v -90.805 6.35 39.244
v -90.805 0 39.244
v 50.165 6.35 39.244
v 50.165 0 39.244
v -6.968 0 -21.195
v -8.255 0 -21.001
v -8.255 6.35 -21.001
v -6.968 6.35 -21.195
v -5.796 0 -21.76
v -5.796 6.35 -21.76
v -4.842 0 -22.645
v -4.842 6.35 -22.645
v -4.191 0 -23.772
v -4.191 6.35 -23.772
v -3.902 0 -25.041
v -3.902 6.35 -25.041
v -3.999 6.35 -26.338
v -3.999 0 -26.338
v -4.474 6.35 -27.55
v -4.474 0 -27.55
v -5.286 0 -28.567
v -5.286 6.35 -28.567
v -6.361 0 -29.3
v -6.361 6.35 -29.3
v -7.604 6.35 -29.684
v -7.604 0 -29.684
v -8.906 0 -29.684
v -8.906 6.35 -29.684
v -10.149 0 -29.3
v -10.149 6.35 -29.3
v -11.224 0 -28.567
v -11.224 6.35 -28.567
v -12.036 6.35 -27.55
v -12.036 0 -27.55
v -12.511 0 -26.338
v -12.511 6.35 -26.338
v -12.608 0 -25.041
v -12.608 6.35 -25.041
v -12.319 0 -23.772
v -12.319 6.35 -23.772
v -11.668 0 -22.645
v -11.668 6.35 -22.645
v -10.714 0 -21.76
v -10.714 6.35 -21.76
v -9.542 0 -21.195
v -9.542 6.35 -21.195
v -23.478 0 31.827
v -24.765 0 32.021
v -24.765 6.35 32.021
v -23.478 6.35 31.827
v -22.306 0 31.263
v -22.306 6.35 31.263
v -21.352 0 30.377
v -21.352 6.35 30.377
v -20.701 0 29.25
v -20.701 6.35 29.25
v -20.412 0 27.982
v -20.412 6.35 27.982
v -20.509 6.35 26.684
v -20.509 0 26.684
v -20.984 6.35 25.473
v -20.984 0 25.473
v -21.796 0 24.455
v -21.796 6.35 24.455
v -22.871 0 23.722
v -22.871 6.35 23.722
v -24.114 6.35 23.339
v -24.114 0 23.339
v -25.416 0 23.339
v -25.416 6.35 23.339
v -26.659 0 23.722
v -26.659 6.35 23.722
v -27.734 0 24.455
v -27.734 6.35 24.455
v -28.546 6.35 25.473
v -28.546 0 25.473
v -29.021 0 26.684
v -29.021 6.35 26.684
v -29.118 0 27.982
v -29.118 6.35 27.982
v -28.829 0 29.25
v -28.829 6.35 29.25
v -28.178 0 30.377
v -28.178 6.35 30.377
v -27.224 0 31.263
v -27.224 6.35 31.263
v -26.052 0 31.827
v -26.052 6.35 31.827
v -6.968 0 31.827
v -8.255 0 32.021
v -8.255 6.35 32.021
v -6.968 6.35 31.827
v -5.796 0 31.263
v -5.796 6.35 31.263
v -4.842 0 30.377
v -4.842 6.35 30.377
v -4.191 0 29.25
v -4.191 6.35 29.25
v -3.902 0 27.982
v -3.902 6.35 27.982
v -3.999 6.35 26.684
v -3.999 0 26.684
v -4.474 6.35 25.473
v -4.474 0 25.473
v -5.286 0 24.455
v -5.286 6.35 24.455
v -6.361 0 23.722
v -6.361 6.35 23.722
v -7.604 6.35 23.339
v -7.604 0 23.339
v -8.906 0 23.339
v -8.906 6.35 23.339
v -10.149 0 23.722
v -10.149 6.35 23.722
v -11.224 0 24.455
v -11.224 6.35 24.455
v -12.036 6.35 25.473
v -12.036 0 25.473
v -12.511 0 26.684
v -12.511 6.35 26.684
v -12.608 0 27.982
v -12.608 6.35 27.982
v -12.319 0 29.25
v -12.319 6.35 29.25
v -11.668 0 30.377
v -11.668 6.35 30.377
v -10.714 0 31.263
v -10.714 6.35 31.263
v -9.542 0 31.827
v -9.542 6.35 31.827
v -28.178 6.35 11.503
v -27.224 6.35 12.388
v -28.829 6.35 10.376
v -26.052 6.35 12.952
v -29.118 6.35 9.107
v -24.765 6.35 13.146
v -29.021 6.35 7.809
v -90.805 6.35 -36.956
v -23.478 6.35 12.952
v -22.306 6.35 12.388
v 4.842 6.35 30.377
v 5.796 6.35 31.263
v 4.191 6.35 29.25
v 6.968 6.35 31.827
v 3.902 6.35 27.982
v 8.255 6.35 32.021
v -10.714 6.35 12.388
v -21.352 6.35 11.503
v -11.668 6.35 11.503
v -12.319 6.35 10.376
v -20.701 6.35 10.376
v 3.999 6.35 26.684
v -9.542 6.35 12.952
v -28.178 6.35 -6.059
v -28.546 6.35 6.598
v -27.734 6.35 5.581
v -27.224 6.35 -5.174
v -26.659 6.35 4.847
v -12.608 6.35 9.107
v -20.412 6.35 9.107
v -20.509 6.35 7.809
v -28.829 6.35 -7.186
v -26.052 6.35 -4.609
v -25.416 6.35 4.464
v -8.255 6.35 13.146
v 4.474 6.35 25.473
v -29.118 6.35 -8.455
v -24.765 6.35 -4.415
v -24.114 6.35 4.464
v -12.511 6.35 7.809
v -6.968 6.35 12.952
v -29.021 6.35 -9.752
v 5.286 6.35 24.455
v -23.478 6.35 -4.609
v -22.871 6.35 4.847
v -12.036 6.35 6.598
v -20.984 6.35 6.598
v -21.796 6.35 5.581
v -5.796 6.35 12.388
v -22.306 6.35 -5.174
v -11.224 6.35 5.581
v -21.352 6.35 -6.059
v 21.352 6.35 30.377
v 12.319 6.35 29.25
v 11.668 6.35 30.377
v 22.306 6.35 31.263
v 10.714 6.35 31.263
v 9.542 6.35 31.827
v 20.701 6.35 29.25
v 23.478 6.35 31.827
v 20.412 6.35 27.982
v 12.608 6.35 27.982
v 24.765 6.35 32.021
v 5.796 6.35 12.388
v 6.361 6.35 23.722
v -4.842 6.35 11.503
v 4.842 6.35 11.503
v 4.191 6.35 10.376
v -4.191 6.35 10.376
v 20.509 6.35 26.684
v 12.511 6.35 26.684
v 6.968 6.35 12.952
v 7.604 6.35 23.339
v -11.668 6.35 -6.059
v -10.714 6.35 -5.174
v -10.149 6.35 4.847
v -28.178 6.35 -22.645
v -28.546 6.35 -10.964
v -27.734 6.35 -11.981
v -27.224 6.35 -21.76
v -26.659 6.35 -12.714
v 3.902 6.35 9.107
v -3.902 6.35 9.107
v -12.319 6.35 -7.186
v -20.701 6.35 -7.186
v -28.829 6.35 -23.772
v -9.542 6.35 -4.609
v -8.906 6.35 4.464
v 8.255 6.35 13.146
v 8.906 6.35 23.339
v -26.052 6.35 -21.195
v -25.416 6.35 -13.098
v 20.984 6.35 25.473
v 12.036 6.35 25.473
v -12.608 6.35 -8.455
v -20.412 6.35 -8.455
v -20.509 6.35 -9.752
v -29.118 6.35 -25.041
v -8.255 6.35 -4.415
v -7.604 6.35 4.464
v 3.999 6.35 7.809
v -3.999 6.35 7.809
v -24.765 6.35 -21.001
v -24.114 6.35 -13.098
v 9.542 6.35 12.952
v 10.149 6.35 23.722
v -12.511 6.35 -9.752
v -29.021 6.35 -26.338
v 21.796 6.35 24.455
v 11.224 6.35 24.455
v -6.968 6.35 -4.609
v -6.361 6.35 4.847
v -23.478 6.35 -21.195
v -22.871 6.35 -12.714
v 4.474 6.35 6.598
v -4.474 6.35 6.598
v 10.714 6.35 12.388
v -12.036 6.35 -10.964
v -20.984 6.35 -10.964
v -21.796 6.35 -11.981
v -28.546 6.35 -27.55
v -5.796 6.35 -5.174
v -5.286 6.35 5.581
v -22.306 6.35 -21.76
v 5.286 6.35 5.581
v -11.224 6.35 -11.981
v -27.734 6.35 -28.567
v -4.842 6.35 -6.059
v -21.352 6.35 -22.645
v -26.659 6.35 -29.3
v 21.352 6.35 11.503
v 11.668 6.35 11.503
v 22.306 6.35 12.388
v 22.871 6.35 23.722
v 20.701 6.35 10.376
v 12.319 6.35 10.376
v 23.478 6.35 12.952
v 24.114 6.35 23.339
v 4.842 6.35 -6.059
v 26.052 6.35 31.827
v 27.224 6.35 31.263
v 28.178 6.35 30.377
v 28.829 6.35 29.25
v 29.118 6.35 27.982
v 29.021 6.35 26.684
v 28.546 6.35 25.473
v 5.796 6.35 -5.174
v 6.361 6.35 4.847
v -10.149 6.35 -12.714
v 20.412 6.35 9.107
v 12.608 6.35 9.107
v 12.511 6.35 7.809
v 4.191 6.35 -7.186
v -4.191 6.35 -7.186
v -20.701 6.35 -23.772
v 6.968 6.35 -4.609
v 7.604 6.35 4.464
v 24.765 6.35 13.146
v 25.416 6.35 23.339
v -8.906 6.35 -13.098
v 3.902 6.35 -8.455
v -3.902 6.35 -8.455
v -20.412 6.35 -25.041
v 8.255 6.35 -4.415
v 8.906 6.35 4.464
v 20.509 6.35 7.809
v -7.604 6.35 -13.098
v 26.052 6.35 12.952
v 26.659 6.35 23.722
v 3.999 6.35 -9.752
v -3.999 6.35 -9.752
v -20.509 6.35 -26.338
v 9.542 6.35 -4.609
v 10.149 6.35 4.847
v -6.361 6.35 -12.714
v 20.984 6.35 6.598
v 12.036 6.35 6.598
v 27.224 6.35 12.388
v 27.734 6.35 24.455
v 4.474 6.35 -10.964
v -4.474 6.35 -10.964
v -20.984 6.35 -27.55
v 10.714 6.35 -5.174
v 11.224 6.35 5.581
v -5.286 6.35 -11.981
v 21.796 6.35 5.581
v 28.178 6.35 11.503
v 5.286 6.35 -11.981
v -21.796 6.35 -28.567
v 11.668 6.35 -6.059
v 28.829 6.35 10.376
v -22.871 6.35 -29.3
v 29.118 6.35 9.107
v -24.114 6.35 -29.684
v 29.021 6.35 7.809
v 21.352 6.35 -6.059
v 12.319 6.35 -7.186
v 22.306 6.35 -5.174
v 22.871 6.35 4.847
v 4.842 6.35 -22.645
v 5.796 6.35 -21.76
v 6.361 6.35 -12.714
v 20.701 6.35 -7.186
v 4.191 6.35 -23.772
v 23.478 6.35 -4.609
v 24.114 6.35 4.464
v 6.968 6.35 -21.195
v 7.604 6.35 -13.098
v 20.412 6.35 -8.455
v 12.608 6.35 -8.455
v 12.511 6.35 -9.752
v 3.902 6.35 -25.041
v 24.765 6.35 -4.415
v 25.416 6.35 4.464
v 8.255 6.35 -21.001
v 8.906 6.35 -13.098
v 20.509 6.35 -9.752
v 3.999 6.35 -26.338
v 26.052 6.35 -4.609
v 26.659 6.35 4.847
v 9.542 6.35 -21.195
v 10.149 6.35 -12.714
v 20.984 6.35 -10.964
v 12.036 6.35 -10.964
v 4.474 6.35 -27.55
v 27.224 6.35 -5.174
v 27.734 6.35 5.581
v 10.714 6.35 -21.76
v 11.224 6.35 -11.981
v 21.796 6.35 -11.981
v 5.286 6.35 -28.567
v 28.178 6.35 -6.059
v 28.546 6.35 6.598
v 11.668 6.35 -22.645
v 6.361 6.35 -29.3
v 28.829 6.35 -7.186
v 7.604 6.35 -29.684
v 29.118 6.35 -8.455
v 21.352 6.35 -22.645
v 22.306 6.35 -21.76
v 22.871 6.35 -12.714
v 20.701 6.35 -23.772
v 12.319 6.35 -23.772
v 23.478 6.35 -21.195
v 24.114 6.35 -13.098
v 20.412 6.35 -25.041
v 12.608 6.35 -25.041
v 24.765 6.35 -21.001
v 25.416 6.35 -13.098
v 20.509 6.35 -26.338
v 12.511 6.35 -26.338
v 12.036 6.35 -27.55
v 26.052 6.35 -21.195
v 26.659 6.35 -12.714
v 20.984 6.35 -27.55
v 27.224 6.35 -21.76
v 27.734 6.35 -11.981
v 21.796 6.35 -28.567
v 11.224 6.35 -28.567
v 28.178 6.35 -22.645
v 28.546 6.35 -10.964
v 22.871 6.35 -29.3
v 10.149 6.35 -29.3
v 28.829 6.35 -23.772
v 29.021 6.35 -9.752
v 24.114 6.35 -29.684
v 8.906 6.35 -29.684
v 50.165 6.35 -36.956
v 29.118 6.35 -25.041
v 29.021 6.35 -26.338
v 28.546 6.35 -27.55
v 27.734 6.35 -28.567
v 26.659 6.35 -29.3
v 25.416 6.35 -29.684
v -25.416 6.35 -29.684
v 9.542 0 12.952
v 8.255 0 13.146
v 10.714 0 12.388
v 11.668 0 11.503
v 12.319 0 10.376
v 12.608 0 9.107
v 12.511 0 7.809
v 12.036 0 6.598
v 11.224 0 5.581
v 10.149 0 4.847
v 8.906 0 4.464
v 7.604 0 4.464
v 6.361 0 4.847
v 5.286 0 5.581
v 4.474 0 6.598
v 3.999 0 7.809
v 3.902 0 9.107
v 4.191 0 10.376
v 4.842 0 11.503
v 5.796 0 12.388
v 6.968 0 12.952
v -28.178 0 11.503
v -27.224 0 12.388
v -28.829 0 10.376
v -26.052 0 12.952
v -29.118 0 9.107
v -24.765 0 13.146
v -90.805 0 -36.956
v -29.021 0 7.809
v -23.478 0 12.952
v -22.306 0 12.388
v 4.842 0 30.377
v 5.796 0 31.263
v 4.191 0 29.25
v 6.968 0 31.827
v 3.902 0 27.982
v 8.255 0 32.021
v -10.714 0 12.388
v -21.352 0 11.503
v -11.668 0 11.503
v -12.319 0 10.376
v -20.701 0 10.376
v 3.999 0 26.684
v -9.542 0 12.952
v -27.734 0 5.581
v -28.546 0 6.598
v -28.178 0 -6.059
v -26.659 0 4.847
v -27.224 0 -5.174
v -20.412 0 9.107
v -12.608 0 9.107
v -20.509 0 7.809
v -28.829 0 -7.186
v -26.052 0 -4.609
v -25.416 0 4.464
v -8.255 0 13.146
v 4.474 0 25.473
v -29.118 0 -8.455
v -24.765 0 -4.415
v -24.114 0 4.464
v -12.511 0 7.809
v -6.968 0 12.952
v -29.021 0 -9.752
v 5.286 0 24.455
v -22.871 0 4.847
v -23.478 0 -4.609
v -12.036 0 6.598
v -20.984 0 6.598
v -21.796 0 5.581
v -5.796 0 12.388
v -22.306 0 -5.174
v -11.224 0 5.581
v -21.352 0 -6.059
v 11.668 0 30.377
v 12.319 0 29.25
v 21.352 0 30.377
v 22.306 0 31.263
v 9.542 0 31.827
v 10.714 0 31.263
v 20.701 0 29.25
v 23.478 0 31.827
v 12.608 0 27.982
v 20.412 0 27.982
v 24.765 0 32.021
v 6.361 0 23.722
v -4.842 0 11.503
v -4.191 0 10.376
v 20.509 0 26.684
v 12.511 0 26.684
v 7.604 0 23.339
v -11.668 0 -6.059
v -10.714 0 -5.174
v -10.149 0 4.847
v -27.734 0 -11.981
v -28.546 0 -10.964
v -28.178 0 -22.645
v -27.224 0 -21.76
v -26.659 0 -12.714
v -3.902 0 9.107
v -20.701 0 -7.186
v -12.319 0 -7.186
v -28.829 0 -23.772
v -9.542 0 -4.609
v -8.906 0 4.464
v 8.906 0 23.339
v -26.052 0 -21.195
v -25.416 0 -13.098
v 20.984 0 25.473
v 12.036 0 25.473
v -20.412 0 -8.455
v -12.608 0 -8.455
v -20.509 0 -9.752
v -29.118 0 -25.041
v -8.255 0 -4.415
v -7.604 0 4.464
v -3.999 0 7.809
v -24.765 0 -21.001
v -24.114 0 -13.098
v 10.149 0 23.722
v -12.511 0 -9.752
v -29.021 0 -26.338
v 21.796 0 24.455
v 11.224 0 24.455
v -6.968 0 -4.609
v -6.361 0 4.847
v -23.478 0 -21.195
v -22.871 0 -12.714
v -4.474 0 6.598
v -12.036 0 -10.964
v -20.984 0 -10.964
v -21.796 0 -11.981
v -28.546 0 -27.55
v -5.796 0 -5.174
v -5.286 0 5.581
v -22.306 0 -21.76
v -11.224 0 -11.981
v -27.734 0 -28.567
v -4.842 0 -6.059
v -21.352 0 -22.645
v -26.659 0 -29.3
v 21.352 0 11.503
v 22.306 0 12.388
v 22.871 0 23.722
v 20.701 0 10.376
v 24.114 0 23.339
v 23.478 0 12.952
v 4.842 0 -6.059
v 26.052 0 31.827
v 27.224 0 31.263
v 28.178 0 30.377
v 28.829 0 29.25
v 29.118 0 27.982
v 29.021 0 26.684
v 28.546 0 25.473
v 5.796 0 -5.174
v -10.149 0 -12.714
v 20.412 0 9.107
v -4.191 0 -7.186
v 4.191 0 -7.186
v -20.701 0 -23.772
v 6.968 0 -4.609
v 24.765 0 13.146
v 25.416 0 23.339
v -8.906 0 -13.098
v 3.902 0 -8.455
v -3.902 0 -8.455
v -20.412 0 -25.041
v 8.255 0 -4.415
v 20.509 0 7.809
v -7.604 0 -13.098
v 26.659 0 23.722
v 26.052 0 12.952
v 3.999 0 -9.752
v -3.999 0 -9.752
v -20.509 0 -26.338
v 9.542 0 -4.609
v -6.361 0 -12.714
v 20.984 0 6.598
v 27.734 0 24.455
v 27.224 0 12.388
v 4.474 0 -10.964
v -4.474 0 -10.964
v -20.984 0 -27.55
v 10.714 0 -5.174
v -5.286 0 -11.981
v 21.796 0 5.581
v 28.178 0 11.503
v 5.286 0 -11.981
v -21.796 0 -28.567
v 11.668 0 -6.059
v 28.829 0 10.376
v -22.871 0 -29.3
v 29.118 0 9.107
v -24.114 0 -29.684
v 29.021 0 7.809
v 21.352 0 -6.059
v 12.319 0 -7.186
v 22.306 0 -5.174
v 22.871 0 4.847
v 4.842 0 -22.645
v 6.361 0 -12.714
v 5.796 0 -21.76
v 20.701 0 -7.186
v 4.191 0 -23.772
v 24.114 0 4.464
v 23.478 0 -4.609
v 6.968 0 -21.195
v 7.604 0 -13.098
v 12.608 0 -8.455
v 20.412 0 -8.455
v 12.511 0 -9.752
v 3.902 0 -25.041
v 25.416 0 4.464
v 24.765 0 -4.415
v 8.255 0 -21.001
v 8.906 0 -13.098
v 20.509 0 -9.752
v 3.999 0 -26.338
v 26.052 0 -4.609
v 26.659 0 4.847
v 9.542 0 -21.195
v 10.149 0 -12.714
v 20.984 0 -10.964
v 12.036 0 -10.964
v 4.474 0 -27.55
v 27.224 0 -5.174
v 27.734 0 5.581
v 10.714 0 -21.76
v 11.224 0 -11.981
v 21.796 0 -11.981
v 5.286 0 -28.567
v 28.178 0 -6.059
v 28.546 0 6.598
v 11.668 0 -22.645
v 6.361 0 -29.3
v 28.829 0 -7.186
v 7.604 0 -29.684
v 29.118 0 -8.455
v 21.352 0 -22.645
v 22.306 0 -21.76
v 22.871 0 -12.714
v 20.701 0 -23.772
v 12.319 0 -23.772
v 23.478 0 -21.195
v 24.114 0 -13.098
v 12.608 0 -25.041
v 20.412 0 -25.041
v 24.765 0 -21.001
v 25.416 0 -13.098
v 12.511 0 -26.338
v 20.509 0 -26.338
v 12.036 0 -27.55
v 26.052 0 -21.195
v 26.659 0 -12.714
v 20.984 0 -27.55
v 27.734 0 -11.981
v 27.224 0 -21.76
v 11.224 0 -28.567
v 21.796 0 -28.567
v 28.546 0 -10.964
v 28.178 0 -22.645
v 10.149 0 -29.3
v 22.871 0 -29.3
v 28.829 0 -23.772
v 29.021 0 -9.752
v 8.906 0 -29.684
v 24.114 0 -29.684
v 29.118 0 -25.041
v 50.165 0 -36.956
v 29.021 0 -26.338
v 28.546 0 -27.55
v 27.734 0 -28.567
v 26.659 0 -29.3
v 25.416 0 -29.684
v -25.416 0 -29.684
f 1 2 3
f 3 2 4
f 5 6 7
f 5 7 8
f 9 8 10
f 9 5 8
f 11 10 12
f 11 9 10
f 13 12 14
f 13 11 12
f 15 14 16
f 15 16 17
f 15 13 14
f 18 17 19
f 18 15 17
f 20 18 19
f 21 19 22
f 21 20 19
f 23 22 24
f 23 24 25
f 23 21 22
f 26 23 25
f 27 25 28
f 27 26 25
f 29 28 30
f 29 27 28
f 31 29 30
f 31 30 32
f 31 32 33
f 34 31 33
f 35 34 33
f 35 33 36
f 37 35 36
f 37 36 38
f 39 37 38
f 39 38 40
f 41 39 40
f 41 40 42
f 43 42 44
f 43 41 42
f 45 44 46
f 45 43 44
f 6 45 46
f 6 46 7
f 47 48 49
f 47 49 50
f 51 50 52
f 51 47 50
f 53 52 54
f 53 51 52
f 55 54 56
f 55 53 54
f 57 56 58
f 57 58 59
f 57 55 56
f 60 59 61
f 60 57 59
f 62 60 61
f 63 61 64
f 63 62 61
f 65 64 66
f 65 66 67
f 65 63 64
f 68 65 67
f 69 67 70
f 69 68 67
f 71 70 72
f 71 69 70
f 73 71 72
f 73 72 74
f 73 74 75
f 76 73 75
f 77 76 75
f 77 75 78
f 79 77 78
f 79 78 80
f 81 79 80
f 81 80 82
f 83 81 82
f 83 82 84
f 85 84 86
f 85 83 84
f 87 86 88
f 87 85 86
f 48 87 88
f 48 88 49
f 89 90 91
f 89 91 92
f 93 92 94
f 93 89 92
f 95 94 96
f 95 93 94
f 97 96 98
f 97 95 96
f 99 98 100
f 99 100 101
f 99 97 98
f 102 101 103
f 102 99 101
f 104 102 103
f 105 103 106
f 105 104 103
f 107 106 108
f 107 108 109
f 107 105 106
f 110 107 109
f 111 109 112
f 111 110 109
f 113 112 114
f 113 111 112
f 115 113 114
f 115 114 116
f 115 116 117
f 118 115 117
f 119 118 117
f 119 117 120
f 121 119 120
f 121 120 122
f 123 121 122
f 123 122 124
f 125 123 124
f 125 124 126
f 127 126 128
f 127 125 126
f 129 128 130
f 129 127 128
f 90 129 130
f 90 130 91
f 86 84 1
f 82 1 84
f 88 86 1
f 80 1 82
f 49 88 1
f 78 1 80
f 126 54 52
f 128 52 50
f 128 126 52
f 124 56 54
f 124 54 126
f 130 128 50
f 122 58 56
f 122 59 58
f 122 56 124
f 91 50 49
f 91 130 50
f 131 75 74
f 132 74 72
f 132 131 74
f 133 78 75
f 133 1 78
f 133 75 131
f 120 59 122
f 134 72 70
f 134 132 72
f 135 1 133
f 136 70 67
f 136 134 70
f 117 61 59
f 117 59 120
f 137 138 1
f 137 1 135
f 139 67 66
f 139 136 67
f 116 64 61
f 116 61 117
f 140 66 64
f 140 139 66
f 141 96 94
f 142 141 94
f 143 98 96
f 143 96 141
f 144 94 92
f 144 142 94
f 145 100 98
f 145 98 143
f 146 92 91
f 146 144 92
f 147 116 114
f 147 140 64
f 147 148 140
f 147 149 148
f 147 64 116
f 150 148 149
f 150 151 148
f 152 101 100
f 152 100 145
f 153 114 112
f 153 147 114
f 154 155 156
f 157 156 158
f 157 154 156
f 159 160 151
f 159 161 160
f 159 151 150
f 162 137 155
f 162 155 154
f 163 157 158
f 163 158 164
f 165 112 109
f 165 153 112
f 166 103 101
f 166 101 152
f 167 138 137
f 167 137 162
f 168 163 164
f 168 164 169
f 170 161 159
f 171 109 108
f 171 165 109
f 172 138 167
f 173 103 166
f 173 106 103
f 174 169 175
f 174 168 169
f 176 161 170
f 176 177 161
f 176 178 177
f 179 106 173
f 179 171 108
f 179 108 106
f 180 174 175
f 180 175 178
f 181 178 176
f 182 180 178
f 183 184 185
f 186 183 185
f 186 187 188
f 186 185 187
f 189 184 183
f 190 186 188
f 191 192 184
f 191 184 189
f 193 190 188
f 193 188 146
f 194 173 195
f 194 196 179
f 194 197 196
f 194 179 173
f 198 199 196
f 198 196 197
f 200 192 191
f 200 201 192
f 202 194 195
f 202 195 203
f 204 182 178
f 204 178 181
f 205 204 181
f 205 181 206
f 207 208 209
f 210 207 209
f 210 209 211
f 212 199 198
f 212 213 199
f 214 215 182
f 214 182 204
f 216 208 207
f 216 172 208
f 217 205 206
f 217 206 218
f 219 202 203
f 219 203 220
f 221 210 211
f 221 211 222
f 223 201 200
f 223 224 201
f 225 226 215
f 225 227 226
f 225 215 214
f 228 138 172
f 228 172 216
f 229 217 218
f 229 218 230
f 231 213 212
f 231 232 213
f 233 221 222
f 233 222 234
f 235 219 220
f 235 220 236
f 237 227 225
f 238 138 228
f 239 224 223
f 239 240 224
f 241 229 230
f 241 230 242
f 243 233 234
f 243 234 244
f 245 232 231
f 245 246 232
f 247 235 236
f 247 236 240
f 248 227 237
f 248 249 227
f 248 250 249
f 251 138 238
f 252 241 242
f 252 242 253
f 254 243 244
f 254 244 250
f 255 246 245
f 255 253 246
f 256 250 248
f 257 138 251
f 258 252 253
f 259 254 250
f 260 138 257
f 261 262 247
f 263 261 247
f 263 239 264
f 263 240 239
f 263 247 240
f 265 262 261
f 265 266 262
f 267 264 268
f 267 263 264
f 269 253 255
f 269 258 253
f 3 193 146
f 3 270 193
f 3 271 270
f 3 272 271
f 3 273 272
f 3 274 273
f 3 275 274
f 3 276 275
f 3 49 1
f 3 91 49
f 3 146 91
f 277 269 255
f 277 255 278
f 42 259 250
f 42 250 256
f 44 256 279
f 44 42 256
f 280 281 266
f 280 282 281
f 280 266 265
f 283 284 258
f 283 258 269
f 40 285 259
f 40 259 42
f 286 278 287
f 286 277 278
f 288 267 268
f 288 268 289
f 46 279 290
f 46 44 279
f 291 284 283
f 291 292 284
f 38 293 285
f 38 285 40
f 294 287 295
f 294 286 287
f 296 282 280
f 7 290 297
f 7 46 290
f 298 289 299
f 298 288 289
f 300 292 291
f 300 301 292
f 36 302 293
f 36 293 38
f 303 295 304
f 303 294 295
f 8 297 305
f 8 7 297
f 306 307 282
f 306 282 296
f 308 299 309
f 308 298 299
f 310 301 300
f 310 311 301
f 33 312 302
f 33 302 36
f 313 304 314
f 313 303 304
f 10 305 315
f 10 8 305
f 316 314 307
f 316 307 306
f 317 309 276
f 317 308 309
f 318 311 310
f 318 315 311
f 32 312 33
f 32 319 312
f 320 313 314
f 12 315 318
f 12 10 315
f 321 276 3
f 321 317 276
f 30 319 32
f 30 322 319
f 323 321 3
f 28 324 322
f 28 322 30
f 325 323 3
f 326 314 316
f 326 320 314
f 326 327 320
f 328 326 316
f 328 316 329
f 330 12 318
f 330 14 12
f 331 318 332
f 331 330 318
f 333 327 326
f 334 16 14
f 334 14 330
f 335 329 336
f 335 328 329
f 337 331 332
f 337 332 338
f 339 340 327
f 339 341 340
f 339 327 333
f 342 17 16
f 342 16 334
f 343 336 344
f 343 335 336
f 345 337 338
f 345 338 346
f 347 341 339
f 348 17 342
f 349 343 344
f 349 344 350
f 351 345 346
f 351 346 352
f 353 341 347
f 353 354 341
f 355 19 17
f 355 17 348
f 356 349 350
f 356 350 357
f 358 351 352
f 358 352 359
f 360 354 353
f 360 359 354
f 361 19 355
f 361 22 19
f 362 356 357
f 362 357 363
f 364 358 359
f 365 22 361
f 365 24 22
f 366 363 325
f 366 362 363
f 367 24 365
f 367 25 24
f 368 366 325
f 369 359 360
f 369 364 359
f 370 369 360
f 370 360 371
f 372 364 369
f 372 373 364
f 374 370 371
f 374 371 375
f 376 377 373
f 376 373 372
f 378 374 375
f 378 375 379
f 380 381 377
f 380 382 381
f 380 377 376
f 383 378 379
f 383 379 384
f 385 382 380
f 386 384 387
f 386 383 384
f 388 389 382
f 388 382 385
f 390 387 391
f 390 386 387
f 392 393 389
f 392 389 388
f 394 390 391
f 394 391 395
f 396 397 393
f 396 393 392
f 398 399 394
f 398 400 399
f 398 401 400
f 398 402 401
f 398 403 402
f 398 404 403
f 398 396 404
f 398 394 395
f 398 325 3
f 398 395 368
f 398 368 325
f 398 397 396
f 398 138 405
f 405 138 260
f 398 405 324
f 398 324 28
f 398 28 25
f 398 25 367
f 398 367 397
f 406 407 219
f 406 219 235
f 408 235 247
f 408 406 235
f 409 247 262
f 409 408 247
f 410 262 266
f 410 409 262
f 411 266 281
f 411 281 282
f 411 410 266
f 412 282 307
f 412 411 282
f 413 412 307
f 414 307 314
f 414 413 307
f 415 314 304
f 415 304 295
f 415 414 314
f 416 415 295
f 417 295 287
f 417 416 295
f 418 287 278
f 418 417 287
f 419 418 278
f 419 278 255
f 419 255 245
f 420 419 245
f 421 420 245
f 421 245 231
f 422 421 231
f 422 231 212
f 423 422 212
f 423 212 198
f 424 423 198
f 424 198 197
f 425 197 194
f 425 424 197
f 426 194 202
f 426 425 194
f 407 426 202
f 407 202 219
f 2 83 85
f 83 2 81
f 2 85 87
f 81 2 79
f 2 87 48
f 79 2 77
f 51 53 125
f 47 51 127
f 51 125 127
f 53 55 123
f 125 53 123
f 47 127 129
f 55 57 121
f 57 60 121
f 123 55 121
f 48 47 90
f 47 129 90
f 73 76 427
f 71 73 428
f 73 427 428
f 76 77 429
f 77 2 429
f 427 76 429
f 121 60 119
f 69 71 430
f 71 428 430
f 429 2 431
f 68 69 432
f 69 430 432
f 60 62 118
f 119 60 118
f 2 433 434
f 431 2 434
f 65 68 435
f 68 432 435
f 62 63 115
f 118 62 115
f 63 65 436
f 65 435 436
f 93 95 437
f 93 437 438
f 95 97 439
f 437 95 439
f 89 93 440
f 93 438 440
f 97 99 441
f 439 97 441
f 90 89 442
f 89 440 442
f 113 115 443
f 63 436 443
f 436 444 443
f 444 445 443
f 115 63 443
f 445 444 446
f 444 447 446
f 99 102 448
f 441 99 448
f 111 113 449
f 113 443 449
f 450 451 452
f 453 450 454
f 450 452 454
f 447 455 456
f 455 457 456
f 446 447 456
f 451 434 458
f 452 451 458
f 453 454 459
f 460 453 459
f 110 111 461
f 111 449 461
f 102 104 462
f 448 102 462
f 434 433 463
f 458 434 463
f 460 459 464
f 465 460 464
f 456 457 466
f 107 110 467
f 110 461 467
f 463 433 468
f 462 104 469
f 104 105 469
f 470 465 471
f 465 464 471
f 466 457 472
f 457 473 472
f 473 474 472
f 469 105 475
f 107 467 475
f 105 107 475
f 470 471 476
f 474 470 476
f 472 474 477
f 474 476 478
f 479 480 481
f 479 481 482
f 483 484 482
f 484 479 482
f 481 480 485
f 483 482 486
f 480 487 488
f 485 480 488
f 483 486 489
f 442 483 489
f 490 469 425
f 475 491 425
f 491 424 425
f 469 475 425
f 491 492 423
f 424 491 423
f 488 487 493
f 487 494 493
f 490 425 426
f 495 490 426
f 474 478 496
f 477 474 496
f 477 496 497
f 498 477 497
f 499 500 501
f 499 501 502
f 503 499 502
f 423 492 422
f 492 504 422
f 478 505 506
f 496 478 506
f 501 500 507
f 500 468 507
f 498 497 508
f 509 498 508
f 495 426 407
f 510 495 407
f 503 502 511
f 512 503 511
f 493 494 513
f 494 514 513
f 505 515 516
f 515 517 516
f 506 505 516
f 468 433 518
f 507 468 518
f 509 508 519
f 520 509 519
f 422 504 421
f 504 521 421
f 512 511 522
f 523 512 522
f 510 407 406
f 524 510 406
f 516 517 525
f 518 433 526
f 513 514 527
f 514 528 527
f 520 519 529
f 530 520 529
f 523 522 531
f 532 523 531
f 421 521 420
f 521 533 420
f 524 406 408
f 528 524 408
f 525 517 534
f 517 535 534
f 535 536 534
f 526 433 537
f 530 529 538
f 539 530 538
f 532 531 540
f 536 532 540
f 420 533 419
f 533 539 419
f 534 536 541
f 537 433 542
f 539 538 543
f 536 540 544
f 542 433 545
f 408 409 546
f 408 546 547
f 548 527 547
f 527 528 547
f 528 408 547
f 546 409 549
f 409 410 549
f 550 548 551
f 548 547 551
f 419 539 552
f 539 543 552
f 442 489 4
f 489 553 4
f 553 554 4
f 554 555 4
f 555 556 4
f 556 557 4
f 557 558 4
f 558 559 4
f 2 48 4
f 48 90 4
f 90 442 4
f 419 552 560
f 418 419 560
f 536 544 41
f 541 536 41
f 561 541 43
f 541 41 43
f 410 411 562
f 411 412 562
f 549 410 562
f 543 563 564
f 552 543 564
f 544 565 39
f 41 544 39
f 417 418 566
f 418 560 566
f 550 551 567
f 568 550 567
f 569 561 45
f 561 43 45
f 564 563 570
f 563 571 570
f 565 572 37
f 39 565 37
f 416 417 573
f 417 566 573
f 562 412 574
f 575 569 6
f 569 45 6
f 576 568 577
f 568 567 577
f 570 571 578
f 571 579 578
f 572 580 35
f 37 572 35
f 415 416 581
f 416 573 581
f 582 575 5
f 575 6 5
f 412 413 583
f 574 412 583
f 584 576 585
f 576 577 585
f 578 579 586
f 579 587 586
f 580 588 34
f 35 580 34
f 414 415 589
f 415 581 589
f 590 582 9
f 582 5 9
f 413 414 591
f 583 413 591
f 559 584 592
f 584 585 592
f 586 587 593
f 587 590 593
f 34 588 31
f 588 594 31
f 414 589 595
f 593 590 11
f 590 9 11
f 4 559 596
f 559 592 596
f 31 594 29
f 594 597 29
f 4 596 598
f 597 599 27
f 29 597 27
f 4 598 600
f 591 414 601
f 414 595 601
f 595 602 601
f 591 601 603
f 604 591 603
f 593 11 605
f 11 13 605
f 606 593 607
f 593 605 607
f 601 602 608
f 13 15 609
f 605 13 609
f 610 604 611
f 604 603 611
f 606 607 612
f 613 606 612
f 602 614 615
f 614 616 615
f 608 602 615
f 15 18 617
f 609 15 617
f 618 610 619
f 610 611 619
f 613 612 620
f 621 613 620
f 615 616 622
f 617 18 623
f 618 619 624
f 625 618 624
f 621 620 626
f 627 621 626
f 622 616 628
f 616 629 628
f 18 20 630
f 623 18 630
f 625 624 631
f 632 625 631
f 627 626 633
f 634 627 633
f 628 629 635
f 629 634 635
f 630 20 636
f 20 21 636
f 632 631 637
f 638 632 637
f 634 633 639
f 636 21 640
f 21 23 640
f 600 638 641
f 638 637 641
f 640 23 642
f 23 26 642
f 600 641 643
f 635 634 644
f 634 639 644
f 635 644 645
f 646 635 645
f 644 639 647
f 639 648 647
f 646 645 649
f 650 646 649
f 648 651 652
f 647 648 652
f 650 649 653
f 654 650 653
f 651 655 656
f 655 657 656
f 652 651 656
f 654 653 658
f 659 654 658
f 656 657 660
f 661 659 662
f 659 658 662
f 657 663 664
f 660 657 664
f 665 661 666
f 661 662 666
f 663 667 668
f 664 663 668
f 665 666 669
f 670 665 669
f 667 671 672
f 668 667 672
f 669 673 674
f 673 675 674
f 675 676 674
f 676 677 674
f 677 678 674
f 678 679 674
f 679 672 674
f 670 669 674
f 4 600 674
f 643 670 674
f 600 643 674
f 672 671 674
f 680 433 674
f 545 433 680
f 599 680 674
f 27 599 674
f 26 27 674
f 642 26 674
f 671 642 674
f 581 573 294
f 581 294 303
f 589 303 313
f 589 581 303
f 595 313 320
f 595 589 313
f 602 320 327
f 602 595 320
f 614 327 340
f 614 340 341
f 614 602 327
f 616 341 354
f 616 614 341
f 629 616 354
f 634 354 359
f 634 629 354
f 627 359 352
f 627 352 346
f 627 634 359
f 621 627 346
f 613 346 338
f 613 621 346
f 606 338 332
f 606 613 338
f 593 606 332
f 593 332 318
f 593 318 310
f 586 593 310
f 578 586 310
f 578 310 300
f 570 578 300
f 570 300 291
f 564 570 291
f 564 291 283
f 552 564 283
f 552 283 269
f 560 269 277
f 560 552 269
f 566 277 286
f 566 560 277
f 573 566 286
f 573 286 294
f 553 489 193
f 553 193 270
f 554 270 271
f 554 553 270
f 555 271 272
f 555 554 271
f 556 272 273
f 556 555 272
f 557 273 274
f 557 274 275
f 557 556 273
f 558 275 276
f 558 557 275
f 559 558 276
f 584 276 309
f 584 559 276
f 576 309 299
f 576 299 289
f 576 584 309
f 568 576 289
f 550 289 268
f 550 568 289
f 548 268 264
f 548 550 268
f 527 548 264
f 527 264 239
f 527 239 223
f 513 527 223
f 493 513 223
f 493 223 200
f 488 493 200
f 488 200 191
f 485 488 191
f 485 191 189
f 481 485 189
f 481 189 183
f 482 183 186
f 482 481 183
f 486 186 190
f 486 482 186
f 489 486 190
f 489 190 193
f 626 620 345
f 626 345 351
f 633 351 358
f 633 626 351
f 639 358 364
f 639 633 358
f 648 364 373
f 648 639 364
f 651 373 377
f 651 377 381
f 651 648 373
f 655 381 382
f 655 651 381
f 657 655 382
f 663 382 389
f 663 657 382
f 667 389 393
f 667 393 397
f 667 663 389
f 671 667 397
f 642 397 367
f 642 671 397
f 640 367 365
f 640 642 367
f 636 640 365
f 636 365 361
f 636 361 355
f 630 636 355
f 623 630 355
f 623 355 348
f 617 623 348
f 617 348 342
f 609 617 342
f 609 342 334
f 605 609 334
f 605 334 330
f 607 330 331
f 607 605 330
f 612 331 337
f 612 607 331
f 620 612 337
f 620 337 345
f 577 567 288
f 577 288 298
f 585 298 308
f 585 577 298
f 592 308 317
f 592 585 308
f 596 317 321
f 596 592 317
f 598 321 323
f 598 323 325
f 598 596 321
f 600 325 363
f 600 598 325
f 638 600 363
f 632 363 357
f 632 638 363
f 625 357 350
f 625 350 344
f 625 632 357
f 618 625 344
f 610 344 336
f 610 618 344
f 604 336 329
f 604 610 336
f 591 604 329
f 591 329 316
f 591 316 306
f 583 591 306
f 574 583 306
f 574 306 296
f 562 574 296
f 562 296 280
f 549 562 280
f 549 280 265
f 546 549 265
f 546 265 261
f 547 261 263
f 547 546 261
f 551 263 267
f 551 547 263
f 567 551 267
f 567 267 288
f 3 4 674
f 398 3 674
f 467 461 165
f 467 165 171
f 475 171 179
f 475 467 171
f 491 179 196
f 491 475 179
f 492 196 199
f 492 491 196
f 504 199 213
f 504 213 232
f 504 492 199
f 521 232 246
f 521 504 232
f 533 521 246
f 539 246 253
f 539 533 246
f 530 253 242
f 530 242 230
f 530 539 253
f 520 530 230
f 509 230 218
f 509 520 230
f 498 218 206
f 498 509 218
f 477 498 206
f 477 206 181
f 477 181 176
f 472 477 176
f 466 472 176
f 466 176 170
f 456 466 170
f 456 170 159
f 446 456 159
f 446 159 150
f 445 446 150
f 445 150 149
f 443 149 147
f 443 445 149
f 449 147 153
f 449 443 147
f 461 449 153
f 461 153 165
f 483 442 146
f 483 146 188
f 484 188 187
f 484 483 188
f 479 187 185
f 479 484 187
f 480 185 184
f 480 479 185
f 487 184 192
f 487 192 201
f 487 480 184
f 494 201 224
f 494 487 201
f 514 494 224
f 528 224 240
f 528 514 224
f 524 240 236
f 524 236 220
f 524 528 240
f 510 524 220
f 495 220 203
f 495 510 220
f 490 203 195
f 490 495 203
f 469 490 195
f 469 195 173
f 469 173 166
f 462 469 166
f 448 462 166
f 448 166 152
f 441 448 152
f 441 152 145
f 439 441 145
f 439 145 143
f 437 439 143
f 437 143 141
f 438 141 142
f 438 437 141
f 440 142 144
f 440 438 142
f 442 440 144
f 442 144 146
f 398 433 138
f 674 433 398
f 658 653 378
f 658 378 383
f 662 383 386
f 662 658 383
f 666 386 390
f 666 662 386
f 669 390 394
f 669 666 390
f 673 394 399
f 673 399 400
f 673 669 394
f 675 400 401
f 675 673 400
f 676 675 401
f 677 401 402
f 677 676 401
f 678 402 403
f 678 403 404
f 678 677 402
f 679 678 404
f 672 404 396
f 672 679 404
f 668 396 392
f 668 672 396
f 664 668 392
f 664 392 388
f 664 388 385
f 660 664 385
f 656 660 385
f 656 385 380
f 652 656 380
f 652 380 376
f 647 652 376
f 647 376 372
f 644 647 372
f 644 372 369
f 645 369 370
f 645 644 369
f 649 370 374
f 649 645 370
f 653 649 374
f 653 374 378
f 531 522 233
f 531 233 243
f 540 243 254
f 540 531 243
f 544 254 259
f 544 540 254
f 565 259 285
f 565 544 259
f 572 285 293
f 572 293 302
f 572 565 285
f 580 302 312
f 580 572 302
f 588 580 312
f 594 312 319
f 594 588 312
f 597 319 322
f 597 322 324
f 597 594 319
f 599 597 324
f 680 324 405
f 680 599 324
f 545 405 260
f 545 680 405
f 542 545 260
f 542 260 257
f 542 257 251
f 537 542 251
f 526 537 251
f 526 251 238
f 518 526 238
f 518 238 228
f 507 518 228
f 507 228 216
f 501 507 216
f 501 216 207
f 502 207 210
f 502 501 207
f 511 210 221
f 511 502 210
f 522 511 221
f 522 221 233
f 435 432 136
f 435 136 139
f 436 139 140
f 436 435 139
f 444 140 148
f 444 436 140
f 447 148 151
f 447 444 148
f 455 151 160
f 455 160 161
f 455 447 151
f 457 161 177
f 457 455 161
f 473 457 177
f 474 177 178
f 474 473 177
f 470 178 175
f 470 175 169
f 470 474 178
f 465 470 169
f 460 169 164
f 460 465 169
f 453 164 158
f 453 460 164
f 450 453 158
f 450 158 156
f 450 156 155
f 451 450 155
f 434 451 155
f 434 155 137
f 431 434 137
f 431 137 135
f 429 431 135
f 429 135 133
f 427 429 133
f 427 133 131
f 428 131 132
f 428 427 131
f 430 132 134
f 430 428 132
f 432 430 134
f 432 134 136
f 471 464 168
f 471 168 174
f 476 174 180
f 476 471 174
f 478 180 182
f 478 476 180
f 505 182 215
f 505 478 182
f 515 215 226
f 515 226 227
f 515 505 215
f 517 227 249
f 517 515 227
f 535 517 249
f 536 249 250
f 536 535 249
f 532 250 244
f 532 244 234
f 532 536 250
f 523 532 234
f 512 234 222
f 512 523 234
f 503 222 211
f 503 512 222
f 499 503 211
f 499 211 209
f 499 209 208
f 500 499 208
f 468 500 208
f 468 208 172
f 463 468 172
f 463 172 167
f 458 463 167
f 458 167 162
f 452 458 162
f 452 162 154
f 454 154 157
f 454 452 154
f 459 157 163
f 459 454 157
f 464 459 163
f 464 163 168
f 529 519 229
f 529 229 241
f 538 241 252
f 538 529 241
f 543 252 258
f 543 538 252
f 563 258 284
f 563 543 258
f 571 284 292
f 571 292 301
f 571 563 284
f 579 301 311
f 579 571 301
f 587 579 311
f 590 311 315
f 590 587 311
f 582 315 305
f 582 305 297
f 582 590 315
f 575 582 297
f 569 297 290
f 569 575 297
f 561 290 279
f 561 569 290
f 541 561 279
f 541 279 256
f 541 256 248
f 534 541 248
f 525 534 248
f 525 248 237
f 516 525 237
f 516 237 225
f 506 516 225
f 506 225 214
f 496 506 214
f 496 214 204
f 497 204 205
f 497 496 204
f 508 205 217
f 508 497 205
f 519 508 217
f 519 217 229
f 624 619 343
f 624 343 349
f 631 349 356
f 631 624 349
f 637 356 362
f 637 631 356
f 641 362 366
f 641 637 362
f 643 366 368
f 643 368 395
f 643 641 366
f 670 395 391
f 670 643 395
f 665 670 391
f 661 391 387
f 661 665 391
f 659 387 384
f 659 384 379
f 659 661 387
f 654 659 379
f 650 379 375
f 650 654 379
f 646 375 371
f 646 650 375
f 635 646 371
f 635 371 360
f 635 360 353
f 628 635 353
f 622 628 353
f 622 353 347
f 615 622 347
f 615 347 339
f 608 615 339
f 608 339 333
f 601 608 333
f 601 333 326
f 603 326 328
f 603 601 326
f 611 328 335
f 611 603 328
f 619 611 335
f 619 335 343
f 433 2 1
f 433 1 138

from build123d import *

# Parameters (mm, degrees)
SKETCH1_W           = 140.97
SKETCH1_H           = 76.2
SKETCH1_R           = 4.365625
BOSS_EXTRUDE1_DEPTH = 6.35


with BuildPart() as part:
    # Sketch1 → Boss-Extrude1 (new body)
    with BuildSketch(Plane(origin=(0, 0, 0), x_dir=(1, 0, 0), z_dir=(0, 1, 0))):
        with Locations((-20.32, -1.14427)):
            Rectangle(SKETCH1_W, SKETCH1_H)
        with Locations(Location((-24.765, 25.36698, 0), (0, 0, 270))):
            Circle(SKETCH1_R, mode=Mode.SUBTRACT)
        with Locations(Location((-8.255, 25.36698, 0), (0, 0, 270))):
            Circle(SKETCH1_R, mode=Mode.SUBTRACT)
        with Locations(Location((8.255, 25.36698, 0), (0, 0, 270))):
            Circle(SKETCH1_R, mode=Mode.SUBTRACT)
        with Locations(Location((24.765, 25.36698, 0), (0, 0, 270))):
            Circle(SKETCH1_R, mode=Mode.SUBTRACT)
        with Locations(Location((24.765, 8.78078, 0), (0, 0, 270))):
            Circle(SKETCH1_R, mode=Mode.SUBTRACT)
        with Locations(Location((8.255, 8.78078, 0), (0, 0, 270))):
            Circle(SKETCH1_R, mode=Mode.SUBTRACT)
        with Locations(Location((-8.255, 8.78078, 0), (0, 0, 270))):
            Circle(SKETCH1_R, mode=Mode.SUBTRACT)
        with Locations(Location((-24.765, 8.78078, 0), (0, 0, 270))):
            Circle(SKETCH1_R, mode=Mode.SUBTRACT)
        with Locations(Location((-24.765, -8.78078, 0), (0, 0, 270))):
            Circle(SKETCH1_R, mode=Mode.SUBTRACT)
        with Locations(Location((-8.255, -8.78078, 0), (0, 0, 270))):
            Circle(SKETCH1_R, mode=Mode.SUBTRACT)
        with Locations(Location((8.255, -8.78078, 0), (0, 0, 270))):
            Circle(SKETCH1_R, mode=Mode.SUBTRACT)
        with Locations(Location((24.765, -8.78078, 0), (0, 0, 270))):
            Circle(SKETCH1_R, mode=Mode.SUBTRACT)
        with Locations(Location((24.765, -27.65552, 0), (0, 0, 270))):
            Circle(SKETCH1_R, mode=Mode.SUBTRACT)
        with Locations(Location((8.255, -27.65552, 0), (0, 0, 270))):
            Circle(SKETCH1_R, mode=Mode.SUBTRACT)
        with Locations(Location((-8.255, -27.65552, 0), (0, 0, 270))):
            Circle(SKETCH1_R, mode=Mode.SUBTRACT)
        with Locations(Location((-24.765, -27.65552, 0), (0, 0, 270))):
            Circle(SKETCH1_R, mode=Mode.SUBTRACT)
    extrude(amount=BOSS_EXTRUDE1_DEPTH)


solid = part.part
